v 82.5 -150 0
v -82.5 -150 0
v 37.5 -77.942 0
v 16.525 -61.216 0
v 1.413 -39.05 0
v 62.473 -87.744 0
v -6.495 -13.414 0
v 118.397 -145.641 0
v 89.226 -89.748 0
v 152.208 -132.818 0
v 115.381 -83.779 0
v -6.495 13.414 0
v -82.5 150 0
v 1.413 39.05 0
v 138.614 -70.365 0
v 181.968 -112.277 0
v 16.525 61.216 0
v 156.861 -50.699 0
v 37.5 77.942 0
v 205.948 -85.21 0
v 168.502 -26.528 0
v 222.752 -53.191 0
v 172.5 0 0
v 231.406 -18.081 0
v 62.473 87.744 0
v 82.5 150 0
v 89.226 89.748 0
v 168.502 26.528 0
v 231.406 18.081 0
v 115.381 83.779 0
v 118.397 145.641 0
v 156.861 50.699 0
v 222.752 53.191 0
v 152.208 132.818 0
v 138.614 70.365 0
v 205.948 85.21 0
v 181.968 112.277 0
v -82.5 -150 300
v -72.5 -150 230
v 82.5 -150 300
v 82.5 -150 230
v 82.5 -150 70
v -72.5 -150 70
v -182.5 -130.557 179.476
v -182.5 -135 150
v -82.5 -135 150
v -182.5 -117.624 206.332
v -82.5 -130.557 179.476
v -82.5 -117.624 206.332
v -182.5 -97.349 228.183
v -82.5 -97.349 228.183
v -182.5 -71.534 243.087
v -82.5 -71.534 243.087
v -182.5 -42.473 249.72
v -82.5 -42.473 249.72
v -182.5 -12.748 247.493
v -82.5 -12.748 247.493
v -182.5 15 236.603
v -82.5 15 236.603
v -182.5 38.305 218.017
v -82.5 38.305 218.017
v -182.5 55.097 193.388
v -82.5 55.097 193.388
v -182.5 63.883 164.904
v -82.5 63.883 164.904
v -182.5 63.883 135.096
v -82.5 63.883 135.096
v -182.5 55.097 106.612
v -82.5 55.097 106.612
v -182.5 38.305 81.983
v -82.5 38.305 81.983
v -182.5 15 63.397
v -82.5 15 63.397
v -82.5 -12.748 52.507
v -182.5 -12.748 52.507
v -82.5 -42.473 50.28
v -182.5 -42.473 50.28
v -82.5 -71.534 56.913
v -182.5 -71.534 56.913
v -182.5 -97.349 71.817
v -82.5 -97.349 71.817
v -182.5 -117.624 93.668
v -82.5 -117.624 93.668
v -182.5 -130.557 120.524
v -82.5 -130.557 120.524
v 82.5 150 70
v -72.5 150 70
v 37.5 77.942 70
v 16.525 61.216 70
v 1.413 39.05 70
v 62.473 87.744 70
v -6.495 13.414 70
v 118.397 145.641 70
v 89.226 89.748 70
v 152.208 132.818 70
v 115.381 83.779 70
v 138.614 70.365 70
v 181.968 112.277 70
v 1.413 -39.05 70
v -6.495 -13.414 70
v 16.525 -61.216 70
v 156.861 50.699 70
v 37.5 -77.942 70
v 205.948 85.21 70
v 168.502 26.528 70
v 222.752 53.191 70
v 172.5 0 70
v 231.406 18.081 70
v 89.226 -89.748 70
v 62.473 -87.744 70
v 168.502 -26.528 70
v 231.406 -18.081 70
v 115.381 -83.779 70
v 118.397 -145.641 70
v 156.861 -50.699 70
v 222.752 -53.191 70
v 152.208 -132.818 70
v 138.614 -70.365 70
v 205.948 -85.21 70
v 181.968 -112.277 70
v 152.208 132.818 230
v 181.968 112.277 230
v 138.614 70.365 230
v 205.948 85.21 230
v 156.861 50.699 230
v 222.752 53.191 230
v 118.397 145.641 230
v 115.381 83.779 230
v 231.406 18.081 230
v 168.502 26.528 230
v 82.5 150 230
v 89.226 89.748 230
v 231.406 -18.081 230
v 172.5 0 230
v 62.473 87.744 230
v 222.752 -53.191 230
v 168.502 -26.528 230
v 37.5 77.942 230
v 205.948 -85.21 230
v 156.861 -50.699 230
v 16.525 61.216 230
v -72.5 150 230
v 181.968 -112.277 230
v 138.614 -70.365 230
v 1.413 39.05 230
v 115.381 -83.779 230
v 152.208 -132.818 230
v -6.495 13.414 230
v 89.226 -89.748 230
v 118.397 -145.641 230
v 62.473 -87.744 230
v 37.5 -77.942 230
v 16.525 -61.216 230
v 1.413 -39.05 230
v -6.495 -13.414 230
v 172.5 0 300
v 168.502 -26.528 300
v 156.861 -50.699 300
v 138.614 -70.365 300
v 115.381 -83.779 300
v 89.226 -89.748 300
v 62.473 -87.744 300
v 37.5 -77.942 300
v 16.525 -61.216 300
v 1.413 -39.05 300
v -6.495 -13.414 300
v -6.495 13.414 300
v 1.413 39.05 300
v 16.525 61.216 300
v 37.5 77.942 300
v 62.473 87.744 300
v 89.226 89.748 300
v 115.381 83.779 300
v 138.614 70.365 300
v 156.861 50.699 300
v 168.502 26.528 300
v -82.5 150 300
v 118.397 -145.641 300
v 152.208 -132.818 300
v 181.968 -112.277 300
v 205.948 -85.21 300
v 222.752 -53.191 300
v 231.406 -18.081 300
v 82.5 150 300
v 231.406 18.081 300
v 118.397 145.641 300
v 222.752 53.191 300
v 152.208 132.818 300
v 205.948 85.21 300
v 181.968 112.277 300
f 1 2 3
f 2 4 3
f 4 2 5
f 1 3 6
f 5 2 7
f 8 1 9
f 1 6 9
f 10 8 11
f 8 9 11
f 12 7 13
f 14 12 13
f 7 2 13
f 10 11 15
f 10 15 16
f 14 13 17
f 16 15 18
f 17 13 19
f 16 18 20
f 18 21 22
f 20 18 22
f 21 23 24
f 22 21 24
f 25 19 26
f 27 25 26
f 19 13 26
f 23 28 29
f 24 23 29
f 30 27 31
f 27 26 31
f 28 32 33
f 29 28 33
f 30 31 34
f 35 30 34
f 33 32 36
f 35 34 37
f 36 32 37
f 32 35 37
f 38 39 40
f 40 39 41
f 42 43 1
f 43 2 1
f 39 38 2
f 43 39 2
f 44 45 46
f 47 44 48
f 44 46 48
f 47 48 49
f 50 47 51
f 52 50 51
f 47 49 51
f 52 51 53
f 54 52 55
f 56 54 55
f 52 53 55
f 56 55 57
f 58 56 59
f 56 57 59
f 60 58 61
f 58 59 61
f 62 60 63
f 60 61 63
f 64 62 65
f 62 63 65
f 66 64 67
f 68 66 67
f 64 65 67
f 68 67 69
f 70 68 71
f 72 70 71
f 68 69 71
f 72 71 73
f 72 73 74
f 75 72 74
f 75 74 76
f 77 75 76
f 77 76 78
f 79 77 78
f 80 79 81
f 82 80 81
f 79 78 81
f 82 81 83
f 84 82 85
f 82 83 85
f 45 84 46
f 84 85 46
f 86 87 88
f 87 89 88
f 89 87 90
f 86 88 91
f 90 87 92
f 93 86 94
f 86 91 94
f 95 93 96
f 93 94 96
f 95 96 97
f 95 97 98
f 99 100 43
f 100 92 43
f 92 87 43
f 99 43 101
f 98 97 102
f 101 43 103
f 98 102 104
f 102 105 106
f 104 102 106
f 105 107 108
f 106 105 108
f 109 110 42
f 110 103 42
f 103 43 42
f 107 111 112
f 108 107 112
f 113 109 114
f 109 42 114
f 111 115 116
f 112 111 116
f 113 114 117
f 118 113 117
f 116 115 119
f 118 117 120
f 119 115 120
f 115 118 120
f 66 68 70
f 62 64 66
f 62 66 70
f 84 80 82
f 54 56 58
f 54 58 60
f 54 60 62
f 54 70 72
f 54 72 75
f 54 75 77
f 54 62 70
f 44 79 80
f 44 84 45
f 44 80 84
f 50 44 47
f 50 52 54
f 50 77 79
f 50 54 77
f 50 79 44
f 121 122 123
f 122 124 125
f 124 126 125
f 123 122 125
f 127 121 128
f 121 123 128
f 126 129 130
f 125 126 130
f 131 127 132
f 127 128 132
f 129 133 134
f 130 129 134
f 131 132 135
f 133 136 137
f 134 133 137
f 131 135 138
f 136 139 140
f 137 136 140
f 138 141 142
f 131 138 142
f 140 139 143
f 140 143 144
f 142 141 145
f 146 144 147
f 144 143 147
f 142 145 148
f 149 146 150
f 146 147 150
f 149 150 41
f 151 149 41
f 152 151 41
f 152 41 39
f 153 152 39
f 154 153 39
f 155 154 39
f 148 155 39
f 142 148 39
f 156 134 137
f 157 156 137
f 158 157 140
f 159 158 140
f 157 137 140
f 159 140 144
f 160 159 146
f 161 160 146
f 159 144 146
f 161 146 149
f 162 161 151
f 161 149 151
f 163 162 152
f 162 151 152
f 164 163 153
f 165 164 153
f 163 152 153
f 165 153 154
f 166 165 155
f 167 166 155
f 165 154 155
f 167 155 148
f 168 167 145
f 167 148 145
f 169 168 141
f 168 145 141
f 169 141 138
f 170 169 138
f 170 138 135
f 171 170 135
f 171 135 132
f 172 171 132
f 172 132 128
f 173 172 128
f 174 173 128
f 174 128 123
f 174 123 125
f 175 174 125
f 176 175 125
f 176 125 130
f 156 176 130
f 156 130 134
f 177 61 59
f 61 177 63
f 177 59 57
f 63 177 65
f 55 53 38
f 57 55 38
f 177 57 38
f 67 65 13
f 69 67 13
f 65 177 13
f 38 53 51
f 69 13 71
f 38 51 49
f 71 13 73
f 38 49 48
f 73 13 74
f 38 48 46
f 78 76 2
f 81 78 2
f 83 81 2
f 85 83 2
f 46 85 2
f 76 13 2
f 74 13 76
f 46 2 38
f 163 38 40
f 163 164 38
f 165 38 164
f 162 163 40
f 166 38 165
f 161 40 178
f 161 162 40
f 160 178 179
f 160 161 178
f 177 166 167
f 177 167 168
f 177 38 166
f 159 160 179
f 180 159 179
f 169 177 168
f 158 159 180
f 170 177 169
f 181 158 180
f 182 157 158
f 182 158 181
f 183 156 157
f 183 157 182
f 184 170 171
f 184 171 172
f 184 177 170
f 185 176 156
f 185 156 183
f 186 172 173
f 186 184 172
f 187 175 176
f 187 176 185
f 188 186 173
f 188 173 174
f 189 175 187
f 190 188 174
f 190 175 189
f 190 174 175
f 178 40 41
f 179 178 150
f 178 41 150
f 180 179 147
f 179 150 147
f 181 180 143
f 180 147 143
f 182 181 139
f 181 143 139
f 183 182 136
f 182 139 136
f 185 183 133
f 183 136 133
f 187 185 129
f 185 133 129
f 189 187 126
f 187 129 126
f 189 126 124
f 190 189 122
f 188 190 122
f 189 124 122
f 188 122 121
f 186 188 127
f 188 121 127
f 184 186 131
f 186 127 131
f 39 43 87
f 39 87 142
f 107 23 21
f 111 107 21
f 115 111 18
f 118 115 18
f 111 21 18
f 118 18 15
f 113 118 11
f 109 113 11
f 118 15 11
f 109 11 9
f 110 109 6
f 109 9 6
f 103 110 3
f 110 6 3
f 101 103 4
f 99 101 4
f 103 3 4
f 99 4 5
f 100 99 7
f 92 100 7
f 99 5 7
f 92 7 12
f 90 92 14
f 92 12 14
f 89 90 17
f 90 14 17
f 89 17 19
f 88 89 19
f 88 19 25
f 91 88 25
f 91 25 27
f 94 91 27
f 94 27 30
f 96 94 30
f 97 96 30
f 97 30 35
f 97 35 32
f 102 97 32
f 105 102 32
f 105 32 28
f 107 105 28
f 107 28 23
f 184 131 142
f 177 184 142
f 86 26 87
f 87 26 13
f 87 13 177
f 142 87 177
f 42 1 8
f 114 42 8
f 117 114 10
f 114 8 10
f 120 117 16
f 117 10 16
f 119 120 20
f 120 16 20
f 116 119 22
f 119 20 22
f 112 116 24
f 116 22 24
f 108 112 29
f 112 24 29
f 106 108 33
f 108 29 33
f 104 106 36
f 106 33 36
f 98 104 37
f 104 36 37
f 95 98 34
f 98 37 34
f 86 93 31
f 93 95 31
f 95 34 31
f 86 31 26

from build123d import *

# Parameters (mm, degrees)
F1_DEPTH = 300
F2_R     = 90
F2_W     = 367.9086971283
F2_H     = 300
F3_DEPTH = 501
F4_W     = 155
F4_H     = 160
F5_DEPTH = 501
F6_R     = 100
F7_DEPTH = 100


with BuildPart() as f1:
    # F0 (on Top) → F1 (new body)
    with BuildSketch(Plane.XY):
        with BuildLine():
            Line((-82.5, -150), (82.5, -150))
            ThreePointArc((82.5, -150), (232.5, 0), (82.5, 150))
            Line((82.5, 150), (-82.5, 150))
            ThreePointArc((-82.5, 150), (-232.5, 0), (-82.5, -150))
        make_face()
    extrude(amount=F1_DEPTH)

    # F2 (on face) → F3 (cut)
    with BuildSketch(Plane(origin=(0, 0, 0), x_dir=(1, 0, 0), z_dir=(0, 0, -1))):
        with Locations((82.5, 0)):
            Circle(F2_R)
        with Locations((-266.4543485641, 0)):
            Rectangle(F2_W, F2_H)
    extrude(amount=-F3_DEPTH, mode=Mode.SUBTRACT)

    # F4 (on face) → F5 (cut)
    with BuildSketch(Plane.XZ.offset(150)):
        with Locations((160, 150)):
            Rectangle(F4_W, F4_H)
        with Locations((5, 150)):
            Rectangle(F4_W, F4_H)
    extrude(amount=-F5_DEPTH, mode=Mode.SUBTRACT)

    # F6 (on face) → F7 (join)
    with BuildSketch(Plane(origin=(-82.5, 0, 0), x_dir=(0, -1, 0), z_dir=(-1, 0, 0))):
        with Locations((35, 150)):
            Circle(F6_R)
    extrude(amount=F7_DEPTH)


solid = f1.part
